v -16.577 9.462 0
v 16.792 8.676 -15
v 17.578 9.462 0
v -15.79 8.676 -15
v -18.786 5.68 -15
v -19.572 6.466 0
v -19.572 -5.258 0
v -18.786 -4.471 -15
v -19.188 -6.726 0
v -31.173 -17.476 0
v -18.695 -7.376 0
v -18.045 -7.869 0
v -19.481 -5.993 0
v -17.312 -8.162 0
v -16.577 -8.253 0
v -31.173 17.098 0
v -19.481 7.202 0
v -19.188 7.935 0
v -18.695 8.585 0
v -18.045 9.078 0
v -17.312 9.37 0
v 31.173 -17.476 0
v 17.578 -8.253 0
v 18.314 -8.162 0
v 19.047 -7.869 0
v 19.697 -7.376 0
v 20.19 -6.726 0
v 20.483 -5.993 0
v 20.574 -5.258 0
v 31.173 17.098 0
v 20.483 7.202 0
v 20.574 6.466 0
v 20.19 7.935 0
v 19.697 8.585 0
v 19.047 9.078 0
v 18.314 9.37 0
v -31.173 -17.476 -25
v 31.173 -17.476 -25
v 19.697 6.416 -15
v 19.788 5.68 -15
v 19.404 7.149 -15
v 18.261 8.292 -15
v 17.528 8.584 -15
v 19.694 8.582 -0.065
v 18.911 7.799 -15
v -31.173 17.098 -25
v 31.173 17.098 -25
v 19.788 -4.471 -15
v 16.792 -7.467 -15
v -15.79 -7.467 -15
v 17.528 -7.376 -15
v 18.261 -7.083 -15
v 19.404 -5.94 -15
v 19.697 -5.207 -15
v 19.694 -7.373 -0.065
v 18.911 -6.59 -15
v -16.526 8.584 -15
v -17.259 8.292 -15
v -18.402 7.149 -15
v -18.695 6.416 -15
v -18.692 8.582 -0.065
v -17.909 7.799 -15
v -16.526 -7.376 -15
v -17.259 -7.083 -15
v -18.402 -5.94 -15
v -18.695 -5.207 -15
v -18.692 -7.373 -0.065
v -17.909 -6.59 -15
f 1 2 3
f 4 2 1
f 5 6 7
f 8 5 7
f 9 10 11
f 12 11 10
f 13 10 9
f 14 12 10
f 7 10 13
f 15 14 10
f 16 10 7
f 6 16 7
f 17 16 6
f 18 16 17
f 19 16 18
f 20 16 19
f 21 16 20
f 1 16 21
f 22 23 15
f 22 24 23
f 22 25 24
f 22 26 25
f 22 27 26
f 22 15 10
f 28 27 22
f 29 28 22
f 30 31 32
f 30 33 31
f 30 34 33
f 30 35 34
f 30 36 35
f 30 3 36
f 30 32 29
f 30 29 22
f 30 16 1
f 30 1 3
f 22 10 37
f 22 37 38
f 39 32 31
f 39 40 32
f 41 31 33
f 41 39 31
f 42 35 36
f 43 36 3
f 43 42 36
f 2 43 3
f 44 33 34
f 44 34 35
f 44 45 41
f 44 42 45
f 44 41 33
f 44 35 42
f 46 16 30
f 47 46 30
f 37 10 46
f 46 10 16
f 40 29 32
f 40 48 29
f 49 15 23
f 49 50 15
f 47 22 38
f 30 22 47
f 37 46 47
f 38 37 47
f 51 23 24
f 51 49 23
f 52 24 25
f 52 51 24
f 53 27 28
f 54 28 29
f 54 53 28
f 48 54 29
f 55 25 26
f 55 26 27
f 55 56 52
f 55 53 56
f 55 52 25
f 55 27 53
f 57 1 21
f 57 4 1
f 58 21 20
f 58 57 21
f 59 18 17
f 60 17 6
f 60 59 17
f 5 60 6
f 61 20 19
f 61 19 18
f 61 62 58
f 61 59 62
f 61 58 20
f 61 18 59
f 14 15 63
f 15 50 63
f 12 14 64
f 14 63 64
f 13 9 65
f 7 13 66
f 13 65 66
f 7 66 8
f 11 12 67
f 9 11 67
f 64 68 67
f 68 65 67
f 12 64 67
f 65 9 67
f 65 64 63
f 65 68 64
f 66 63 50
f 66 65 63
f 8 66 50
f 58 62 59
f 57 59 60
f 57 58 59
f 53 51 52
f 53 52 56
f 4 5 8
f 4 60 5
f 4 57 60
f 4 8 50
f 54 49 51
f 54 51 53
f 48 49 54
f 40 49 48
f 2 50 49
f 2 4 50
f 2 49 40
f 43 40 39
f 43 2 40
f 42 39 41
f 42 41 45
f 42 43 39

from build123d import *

# Parameters (mm, degrees)
F0_W     = 62.345456332
F0_H     = 34.5733892173
F1_DEPTH = 25
F2_W     = 40.1466805488
F2_H     = 17.7154000849
F3_DEPTH = 15
F3_TAPER = 3
F4_R     = 3


with BuildPart() as f1:
    # F0 (on Top) → F1 (new body)
    with BuildSketch(Plane.XY):
        with Locations((0, -0.1889253035)):
            Rectangle(F0_W, F0_H)
    extrude(amount=-F1_DEPTH)

    # F2 (on face) → F3 (cut)
    with BuildSketch(Plane.XY):
        with Locations((0.5009016022, 0.604307279)):
            Rectangle(F2_W, F2_H)
    extrude(amount=-F3_DEPTH, taper=F3_TAPER, mode=Mode.SUBTRACT)

    # F4
    f4_edges = [f1.edges().sort_by_distance(p)[0] for p in [
        (-19.17938, 9.068949, -7.5),
        (-19.17938, -7.860334, -7.5),
        (20.181184, 9.068949, -7.5),
        (20.181184, -7.860334, -7.5),
    ]]
    fillet(f4_edges, radius=F4_R)


solid = f1.part
